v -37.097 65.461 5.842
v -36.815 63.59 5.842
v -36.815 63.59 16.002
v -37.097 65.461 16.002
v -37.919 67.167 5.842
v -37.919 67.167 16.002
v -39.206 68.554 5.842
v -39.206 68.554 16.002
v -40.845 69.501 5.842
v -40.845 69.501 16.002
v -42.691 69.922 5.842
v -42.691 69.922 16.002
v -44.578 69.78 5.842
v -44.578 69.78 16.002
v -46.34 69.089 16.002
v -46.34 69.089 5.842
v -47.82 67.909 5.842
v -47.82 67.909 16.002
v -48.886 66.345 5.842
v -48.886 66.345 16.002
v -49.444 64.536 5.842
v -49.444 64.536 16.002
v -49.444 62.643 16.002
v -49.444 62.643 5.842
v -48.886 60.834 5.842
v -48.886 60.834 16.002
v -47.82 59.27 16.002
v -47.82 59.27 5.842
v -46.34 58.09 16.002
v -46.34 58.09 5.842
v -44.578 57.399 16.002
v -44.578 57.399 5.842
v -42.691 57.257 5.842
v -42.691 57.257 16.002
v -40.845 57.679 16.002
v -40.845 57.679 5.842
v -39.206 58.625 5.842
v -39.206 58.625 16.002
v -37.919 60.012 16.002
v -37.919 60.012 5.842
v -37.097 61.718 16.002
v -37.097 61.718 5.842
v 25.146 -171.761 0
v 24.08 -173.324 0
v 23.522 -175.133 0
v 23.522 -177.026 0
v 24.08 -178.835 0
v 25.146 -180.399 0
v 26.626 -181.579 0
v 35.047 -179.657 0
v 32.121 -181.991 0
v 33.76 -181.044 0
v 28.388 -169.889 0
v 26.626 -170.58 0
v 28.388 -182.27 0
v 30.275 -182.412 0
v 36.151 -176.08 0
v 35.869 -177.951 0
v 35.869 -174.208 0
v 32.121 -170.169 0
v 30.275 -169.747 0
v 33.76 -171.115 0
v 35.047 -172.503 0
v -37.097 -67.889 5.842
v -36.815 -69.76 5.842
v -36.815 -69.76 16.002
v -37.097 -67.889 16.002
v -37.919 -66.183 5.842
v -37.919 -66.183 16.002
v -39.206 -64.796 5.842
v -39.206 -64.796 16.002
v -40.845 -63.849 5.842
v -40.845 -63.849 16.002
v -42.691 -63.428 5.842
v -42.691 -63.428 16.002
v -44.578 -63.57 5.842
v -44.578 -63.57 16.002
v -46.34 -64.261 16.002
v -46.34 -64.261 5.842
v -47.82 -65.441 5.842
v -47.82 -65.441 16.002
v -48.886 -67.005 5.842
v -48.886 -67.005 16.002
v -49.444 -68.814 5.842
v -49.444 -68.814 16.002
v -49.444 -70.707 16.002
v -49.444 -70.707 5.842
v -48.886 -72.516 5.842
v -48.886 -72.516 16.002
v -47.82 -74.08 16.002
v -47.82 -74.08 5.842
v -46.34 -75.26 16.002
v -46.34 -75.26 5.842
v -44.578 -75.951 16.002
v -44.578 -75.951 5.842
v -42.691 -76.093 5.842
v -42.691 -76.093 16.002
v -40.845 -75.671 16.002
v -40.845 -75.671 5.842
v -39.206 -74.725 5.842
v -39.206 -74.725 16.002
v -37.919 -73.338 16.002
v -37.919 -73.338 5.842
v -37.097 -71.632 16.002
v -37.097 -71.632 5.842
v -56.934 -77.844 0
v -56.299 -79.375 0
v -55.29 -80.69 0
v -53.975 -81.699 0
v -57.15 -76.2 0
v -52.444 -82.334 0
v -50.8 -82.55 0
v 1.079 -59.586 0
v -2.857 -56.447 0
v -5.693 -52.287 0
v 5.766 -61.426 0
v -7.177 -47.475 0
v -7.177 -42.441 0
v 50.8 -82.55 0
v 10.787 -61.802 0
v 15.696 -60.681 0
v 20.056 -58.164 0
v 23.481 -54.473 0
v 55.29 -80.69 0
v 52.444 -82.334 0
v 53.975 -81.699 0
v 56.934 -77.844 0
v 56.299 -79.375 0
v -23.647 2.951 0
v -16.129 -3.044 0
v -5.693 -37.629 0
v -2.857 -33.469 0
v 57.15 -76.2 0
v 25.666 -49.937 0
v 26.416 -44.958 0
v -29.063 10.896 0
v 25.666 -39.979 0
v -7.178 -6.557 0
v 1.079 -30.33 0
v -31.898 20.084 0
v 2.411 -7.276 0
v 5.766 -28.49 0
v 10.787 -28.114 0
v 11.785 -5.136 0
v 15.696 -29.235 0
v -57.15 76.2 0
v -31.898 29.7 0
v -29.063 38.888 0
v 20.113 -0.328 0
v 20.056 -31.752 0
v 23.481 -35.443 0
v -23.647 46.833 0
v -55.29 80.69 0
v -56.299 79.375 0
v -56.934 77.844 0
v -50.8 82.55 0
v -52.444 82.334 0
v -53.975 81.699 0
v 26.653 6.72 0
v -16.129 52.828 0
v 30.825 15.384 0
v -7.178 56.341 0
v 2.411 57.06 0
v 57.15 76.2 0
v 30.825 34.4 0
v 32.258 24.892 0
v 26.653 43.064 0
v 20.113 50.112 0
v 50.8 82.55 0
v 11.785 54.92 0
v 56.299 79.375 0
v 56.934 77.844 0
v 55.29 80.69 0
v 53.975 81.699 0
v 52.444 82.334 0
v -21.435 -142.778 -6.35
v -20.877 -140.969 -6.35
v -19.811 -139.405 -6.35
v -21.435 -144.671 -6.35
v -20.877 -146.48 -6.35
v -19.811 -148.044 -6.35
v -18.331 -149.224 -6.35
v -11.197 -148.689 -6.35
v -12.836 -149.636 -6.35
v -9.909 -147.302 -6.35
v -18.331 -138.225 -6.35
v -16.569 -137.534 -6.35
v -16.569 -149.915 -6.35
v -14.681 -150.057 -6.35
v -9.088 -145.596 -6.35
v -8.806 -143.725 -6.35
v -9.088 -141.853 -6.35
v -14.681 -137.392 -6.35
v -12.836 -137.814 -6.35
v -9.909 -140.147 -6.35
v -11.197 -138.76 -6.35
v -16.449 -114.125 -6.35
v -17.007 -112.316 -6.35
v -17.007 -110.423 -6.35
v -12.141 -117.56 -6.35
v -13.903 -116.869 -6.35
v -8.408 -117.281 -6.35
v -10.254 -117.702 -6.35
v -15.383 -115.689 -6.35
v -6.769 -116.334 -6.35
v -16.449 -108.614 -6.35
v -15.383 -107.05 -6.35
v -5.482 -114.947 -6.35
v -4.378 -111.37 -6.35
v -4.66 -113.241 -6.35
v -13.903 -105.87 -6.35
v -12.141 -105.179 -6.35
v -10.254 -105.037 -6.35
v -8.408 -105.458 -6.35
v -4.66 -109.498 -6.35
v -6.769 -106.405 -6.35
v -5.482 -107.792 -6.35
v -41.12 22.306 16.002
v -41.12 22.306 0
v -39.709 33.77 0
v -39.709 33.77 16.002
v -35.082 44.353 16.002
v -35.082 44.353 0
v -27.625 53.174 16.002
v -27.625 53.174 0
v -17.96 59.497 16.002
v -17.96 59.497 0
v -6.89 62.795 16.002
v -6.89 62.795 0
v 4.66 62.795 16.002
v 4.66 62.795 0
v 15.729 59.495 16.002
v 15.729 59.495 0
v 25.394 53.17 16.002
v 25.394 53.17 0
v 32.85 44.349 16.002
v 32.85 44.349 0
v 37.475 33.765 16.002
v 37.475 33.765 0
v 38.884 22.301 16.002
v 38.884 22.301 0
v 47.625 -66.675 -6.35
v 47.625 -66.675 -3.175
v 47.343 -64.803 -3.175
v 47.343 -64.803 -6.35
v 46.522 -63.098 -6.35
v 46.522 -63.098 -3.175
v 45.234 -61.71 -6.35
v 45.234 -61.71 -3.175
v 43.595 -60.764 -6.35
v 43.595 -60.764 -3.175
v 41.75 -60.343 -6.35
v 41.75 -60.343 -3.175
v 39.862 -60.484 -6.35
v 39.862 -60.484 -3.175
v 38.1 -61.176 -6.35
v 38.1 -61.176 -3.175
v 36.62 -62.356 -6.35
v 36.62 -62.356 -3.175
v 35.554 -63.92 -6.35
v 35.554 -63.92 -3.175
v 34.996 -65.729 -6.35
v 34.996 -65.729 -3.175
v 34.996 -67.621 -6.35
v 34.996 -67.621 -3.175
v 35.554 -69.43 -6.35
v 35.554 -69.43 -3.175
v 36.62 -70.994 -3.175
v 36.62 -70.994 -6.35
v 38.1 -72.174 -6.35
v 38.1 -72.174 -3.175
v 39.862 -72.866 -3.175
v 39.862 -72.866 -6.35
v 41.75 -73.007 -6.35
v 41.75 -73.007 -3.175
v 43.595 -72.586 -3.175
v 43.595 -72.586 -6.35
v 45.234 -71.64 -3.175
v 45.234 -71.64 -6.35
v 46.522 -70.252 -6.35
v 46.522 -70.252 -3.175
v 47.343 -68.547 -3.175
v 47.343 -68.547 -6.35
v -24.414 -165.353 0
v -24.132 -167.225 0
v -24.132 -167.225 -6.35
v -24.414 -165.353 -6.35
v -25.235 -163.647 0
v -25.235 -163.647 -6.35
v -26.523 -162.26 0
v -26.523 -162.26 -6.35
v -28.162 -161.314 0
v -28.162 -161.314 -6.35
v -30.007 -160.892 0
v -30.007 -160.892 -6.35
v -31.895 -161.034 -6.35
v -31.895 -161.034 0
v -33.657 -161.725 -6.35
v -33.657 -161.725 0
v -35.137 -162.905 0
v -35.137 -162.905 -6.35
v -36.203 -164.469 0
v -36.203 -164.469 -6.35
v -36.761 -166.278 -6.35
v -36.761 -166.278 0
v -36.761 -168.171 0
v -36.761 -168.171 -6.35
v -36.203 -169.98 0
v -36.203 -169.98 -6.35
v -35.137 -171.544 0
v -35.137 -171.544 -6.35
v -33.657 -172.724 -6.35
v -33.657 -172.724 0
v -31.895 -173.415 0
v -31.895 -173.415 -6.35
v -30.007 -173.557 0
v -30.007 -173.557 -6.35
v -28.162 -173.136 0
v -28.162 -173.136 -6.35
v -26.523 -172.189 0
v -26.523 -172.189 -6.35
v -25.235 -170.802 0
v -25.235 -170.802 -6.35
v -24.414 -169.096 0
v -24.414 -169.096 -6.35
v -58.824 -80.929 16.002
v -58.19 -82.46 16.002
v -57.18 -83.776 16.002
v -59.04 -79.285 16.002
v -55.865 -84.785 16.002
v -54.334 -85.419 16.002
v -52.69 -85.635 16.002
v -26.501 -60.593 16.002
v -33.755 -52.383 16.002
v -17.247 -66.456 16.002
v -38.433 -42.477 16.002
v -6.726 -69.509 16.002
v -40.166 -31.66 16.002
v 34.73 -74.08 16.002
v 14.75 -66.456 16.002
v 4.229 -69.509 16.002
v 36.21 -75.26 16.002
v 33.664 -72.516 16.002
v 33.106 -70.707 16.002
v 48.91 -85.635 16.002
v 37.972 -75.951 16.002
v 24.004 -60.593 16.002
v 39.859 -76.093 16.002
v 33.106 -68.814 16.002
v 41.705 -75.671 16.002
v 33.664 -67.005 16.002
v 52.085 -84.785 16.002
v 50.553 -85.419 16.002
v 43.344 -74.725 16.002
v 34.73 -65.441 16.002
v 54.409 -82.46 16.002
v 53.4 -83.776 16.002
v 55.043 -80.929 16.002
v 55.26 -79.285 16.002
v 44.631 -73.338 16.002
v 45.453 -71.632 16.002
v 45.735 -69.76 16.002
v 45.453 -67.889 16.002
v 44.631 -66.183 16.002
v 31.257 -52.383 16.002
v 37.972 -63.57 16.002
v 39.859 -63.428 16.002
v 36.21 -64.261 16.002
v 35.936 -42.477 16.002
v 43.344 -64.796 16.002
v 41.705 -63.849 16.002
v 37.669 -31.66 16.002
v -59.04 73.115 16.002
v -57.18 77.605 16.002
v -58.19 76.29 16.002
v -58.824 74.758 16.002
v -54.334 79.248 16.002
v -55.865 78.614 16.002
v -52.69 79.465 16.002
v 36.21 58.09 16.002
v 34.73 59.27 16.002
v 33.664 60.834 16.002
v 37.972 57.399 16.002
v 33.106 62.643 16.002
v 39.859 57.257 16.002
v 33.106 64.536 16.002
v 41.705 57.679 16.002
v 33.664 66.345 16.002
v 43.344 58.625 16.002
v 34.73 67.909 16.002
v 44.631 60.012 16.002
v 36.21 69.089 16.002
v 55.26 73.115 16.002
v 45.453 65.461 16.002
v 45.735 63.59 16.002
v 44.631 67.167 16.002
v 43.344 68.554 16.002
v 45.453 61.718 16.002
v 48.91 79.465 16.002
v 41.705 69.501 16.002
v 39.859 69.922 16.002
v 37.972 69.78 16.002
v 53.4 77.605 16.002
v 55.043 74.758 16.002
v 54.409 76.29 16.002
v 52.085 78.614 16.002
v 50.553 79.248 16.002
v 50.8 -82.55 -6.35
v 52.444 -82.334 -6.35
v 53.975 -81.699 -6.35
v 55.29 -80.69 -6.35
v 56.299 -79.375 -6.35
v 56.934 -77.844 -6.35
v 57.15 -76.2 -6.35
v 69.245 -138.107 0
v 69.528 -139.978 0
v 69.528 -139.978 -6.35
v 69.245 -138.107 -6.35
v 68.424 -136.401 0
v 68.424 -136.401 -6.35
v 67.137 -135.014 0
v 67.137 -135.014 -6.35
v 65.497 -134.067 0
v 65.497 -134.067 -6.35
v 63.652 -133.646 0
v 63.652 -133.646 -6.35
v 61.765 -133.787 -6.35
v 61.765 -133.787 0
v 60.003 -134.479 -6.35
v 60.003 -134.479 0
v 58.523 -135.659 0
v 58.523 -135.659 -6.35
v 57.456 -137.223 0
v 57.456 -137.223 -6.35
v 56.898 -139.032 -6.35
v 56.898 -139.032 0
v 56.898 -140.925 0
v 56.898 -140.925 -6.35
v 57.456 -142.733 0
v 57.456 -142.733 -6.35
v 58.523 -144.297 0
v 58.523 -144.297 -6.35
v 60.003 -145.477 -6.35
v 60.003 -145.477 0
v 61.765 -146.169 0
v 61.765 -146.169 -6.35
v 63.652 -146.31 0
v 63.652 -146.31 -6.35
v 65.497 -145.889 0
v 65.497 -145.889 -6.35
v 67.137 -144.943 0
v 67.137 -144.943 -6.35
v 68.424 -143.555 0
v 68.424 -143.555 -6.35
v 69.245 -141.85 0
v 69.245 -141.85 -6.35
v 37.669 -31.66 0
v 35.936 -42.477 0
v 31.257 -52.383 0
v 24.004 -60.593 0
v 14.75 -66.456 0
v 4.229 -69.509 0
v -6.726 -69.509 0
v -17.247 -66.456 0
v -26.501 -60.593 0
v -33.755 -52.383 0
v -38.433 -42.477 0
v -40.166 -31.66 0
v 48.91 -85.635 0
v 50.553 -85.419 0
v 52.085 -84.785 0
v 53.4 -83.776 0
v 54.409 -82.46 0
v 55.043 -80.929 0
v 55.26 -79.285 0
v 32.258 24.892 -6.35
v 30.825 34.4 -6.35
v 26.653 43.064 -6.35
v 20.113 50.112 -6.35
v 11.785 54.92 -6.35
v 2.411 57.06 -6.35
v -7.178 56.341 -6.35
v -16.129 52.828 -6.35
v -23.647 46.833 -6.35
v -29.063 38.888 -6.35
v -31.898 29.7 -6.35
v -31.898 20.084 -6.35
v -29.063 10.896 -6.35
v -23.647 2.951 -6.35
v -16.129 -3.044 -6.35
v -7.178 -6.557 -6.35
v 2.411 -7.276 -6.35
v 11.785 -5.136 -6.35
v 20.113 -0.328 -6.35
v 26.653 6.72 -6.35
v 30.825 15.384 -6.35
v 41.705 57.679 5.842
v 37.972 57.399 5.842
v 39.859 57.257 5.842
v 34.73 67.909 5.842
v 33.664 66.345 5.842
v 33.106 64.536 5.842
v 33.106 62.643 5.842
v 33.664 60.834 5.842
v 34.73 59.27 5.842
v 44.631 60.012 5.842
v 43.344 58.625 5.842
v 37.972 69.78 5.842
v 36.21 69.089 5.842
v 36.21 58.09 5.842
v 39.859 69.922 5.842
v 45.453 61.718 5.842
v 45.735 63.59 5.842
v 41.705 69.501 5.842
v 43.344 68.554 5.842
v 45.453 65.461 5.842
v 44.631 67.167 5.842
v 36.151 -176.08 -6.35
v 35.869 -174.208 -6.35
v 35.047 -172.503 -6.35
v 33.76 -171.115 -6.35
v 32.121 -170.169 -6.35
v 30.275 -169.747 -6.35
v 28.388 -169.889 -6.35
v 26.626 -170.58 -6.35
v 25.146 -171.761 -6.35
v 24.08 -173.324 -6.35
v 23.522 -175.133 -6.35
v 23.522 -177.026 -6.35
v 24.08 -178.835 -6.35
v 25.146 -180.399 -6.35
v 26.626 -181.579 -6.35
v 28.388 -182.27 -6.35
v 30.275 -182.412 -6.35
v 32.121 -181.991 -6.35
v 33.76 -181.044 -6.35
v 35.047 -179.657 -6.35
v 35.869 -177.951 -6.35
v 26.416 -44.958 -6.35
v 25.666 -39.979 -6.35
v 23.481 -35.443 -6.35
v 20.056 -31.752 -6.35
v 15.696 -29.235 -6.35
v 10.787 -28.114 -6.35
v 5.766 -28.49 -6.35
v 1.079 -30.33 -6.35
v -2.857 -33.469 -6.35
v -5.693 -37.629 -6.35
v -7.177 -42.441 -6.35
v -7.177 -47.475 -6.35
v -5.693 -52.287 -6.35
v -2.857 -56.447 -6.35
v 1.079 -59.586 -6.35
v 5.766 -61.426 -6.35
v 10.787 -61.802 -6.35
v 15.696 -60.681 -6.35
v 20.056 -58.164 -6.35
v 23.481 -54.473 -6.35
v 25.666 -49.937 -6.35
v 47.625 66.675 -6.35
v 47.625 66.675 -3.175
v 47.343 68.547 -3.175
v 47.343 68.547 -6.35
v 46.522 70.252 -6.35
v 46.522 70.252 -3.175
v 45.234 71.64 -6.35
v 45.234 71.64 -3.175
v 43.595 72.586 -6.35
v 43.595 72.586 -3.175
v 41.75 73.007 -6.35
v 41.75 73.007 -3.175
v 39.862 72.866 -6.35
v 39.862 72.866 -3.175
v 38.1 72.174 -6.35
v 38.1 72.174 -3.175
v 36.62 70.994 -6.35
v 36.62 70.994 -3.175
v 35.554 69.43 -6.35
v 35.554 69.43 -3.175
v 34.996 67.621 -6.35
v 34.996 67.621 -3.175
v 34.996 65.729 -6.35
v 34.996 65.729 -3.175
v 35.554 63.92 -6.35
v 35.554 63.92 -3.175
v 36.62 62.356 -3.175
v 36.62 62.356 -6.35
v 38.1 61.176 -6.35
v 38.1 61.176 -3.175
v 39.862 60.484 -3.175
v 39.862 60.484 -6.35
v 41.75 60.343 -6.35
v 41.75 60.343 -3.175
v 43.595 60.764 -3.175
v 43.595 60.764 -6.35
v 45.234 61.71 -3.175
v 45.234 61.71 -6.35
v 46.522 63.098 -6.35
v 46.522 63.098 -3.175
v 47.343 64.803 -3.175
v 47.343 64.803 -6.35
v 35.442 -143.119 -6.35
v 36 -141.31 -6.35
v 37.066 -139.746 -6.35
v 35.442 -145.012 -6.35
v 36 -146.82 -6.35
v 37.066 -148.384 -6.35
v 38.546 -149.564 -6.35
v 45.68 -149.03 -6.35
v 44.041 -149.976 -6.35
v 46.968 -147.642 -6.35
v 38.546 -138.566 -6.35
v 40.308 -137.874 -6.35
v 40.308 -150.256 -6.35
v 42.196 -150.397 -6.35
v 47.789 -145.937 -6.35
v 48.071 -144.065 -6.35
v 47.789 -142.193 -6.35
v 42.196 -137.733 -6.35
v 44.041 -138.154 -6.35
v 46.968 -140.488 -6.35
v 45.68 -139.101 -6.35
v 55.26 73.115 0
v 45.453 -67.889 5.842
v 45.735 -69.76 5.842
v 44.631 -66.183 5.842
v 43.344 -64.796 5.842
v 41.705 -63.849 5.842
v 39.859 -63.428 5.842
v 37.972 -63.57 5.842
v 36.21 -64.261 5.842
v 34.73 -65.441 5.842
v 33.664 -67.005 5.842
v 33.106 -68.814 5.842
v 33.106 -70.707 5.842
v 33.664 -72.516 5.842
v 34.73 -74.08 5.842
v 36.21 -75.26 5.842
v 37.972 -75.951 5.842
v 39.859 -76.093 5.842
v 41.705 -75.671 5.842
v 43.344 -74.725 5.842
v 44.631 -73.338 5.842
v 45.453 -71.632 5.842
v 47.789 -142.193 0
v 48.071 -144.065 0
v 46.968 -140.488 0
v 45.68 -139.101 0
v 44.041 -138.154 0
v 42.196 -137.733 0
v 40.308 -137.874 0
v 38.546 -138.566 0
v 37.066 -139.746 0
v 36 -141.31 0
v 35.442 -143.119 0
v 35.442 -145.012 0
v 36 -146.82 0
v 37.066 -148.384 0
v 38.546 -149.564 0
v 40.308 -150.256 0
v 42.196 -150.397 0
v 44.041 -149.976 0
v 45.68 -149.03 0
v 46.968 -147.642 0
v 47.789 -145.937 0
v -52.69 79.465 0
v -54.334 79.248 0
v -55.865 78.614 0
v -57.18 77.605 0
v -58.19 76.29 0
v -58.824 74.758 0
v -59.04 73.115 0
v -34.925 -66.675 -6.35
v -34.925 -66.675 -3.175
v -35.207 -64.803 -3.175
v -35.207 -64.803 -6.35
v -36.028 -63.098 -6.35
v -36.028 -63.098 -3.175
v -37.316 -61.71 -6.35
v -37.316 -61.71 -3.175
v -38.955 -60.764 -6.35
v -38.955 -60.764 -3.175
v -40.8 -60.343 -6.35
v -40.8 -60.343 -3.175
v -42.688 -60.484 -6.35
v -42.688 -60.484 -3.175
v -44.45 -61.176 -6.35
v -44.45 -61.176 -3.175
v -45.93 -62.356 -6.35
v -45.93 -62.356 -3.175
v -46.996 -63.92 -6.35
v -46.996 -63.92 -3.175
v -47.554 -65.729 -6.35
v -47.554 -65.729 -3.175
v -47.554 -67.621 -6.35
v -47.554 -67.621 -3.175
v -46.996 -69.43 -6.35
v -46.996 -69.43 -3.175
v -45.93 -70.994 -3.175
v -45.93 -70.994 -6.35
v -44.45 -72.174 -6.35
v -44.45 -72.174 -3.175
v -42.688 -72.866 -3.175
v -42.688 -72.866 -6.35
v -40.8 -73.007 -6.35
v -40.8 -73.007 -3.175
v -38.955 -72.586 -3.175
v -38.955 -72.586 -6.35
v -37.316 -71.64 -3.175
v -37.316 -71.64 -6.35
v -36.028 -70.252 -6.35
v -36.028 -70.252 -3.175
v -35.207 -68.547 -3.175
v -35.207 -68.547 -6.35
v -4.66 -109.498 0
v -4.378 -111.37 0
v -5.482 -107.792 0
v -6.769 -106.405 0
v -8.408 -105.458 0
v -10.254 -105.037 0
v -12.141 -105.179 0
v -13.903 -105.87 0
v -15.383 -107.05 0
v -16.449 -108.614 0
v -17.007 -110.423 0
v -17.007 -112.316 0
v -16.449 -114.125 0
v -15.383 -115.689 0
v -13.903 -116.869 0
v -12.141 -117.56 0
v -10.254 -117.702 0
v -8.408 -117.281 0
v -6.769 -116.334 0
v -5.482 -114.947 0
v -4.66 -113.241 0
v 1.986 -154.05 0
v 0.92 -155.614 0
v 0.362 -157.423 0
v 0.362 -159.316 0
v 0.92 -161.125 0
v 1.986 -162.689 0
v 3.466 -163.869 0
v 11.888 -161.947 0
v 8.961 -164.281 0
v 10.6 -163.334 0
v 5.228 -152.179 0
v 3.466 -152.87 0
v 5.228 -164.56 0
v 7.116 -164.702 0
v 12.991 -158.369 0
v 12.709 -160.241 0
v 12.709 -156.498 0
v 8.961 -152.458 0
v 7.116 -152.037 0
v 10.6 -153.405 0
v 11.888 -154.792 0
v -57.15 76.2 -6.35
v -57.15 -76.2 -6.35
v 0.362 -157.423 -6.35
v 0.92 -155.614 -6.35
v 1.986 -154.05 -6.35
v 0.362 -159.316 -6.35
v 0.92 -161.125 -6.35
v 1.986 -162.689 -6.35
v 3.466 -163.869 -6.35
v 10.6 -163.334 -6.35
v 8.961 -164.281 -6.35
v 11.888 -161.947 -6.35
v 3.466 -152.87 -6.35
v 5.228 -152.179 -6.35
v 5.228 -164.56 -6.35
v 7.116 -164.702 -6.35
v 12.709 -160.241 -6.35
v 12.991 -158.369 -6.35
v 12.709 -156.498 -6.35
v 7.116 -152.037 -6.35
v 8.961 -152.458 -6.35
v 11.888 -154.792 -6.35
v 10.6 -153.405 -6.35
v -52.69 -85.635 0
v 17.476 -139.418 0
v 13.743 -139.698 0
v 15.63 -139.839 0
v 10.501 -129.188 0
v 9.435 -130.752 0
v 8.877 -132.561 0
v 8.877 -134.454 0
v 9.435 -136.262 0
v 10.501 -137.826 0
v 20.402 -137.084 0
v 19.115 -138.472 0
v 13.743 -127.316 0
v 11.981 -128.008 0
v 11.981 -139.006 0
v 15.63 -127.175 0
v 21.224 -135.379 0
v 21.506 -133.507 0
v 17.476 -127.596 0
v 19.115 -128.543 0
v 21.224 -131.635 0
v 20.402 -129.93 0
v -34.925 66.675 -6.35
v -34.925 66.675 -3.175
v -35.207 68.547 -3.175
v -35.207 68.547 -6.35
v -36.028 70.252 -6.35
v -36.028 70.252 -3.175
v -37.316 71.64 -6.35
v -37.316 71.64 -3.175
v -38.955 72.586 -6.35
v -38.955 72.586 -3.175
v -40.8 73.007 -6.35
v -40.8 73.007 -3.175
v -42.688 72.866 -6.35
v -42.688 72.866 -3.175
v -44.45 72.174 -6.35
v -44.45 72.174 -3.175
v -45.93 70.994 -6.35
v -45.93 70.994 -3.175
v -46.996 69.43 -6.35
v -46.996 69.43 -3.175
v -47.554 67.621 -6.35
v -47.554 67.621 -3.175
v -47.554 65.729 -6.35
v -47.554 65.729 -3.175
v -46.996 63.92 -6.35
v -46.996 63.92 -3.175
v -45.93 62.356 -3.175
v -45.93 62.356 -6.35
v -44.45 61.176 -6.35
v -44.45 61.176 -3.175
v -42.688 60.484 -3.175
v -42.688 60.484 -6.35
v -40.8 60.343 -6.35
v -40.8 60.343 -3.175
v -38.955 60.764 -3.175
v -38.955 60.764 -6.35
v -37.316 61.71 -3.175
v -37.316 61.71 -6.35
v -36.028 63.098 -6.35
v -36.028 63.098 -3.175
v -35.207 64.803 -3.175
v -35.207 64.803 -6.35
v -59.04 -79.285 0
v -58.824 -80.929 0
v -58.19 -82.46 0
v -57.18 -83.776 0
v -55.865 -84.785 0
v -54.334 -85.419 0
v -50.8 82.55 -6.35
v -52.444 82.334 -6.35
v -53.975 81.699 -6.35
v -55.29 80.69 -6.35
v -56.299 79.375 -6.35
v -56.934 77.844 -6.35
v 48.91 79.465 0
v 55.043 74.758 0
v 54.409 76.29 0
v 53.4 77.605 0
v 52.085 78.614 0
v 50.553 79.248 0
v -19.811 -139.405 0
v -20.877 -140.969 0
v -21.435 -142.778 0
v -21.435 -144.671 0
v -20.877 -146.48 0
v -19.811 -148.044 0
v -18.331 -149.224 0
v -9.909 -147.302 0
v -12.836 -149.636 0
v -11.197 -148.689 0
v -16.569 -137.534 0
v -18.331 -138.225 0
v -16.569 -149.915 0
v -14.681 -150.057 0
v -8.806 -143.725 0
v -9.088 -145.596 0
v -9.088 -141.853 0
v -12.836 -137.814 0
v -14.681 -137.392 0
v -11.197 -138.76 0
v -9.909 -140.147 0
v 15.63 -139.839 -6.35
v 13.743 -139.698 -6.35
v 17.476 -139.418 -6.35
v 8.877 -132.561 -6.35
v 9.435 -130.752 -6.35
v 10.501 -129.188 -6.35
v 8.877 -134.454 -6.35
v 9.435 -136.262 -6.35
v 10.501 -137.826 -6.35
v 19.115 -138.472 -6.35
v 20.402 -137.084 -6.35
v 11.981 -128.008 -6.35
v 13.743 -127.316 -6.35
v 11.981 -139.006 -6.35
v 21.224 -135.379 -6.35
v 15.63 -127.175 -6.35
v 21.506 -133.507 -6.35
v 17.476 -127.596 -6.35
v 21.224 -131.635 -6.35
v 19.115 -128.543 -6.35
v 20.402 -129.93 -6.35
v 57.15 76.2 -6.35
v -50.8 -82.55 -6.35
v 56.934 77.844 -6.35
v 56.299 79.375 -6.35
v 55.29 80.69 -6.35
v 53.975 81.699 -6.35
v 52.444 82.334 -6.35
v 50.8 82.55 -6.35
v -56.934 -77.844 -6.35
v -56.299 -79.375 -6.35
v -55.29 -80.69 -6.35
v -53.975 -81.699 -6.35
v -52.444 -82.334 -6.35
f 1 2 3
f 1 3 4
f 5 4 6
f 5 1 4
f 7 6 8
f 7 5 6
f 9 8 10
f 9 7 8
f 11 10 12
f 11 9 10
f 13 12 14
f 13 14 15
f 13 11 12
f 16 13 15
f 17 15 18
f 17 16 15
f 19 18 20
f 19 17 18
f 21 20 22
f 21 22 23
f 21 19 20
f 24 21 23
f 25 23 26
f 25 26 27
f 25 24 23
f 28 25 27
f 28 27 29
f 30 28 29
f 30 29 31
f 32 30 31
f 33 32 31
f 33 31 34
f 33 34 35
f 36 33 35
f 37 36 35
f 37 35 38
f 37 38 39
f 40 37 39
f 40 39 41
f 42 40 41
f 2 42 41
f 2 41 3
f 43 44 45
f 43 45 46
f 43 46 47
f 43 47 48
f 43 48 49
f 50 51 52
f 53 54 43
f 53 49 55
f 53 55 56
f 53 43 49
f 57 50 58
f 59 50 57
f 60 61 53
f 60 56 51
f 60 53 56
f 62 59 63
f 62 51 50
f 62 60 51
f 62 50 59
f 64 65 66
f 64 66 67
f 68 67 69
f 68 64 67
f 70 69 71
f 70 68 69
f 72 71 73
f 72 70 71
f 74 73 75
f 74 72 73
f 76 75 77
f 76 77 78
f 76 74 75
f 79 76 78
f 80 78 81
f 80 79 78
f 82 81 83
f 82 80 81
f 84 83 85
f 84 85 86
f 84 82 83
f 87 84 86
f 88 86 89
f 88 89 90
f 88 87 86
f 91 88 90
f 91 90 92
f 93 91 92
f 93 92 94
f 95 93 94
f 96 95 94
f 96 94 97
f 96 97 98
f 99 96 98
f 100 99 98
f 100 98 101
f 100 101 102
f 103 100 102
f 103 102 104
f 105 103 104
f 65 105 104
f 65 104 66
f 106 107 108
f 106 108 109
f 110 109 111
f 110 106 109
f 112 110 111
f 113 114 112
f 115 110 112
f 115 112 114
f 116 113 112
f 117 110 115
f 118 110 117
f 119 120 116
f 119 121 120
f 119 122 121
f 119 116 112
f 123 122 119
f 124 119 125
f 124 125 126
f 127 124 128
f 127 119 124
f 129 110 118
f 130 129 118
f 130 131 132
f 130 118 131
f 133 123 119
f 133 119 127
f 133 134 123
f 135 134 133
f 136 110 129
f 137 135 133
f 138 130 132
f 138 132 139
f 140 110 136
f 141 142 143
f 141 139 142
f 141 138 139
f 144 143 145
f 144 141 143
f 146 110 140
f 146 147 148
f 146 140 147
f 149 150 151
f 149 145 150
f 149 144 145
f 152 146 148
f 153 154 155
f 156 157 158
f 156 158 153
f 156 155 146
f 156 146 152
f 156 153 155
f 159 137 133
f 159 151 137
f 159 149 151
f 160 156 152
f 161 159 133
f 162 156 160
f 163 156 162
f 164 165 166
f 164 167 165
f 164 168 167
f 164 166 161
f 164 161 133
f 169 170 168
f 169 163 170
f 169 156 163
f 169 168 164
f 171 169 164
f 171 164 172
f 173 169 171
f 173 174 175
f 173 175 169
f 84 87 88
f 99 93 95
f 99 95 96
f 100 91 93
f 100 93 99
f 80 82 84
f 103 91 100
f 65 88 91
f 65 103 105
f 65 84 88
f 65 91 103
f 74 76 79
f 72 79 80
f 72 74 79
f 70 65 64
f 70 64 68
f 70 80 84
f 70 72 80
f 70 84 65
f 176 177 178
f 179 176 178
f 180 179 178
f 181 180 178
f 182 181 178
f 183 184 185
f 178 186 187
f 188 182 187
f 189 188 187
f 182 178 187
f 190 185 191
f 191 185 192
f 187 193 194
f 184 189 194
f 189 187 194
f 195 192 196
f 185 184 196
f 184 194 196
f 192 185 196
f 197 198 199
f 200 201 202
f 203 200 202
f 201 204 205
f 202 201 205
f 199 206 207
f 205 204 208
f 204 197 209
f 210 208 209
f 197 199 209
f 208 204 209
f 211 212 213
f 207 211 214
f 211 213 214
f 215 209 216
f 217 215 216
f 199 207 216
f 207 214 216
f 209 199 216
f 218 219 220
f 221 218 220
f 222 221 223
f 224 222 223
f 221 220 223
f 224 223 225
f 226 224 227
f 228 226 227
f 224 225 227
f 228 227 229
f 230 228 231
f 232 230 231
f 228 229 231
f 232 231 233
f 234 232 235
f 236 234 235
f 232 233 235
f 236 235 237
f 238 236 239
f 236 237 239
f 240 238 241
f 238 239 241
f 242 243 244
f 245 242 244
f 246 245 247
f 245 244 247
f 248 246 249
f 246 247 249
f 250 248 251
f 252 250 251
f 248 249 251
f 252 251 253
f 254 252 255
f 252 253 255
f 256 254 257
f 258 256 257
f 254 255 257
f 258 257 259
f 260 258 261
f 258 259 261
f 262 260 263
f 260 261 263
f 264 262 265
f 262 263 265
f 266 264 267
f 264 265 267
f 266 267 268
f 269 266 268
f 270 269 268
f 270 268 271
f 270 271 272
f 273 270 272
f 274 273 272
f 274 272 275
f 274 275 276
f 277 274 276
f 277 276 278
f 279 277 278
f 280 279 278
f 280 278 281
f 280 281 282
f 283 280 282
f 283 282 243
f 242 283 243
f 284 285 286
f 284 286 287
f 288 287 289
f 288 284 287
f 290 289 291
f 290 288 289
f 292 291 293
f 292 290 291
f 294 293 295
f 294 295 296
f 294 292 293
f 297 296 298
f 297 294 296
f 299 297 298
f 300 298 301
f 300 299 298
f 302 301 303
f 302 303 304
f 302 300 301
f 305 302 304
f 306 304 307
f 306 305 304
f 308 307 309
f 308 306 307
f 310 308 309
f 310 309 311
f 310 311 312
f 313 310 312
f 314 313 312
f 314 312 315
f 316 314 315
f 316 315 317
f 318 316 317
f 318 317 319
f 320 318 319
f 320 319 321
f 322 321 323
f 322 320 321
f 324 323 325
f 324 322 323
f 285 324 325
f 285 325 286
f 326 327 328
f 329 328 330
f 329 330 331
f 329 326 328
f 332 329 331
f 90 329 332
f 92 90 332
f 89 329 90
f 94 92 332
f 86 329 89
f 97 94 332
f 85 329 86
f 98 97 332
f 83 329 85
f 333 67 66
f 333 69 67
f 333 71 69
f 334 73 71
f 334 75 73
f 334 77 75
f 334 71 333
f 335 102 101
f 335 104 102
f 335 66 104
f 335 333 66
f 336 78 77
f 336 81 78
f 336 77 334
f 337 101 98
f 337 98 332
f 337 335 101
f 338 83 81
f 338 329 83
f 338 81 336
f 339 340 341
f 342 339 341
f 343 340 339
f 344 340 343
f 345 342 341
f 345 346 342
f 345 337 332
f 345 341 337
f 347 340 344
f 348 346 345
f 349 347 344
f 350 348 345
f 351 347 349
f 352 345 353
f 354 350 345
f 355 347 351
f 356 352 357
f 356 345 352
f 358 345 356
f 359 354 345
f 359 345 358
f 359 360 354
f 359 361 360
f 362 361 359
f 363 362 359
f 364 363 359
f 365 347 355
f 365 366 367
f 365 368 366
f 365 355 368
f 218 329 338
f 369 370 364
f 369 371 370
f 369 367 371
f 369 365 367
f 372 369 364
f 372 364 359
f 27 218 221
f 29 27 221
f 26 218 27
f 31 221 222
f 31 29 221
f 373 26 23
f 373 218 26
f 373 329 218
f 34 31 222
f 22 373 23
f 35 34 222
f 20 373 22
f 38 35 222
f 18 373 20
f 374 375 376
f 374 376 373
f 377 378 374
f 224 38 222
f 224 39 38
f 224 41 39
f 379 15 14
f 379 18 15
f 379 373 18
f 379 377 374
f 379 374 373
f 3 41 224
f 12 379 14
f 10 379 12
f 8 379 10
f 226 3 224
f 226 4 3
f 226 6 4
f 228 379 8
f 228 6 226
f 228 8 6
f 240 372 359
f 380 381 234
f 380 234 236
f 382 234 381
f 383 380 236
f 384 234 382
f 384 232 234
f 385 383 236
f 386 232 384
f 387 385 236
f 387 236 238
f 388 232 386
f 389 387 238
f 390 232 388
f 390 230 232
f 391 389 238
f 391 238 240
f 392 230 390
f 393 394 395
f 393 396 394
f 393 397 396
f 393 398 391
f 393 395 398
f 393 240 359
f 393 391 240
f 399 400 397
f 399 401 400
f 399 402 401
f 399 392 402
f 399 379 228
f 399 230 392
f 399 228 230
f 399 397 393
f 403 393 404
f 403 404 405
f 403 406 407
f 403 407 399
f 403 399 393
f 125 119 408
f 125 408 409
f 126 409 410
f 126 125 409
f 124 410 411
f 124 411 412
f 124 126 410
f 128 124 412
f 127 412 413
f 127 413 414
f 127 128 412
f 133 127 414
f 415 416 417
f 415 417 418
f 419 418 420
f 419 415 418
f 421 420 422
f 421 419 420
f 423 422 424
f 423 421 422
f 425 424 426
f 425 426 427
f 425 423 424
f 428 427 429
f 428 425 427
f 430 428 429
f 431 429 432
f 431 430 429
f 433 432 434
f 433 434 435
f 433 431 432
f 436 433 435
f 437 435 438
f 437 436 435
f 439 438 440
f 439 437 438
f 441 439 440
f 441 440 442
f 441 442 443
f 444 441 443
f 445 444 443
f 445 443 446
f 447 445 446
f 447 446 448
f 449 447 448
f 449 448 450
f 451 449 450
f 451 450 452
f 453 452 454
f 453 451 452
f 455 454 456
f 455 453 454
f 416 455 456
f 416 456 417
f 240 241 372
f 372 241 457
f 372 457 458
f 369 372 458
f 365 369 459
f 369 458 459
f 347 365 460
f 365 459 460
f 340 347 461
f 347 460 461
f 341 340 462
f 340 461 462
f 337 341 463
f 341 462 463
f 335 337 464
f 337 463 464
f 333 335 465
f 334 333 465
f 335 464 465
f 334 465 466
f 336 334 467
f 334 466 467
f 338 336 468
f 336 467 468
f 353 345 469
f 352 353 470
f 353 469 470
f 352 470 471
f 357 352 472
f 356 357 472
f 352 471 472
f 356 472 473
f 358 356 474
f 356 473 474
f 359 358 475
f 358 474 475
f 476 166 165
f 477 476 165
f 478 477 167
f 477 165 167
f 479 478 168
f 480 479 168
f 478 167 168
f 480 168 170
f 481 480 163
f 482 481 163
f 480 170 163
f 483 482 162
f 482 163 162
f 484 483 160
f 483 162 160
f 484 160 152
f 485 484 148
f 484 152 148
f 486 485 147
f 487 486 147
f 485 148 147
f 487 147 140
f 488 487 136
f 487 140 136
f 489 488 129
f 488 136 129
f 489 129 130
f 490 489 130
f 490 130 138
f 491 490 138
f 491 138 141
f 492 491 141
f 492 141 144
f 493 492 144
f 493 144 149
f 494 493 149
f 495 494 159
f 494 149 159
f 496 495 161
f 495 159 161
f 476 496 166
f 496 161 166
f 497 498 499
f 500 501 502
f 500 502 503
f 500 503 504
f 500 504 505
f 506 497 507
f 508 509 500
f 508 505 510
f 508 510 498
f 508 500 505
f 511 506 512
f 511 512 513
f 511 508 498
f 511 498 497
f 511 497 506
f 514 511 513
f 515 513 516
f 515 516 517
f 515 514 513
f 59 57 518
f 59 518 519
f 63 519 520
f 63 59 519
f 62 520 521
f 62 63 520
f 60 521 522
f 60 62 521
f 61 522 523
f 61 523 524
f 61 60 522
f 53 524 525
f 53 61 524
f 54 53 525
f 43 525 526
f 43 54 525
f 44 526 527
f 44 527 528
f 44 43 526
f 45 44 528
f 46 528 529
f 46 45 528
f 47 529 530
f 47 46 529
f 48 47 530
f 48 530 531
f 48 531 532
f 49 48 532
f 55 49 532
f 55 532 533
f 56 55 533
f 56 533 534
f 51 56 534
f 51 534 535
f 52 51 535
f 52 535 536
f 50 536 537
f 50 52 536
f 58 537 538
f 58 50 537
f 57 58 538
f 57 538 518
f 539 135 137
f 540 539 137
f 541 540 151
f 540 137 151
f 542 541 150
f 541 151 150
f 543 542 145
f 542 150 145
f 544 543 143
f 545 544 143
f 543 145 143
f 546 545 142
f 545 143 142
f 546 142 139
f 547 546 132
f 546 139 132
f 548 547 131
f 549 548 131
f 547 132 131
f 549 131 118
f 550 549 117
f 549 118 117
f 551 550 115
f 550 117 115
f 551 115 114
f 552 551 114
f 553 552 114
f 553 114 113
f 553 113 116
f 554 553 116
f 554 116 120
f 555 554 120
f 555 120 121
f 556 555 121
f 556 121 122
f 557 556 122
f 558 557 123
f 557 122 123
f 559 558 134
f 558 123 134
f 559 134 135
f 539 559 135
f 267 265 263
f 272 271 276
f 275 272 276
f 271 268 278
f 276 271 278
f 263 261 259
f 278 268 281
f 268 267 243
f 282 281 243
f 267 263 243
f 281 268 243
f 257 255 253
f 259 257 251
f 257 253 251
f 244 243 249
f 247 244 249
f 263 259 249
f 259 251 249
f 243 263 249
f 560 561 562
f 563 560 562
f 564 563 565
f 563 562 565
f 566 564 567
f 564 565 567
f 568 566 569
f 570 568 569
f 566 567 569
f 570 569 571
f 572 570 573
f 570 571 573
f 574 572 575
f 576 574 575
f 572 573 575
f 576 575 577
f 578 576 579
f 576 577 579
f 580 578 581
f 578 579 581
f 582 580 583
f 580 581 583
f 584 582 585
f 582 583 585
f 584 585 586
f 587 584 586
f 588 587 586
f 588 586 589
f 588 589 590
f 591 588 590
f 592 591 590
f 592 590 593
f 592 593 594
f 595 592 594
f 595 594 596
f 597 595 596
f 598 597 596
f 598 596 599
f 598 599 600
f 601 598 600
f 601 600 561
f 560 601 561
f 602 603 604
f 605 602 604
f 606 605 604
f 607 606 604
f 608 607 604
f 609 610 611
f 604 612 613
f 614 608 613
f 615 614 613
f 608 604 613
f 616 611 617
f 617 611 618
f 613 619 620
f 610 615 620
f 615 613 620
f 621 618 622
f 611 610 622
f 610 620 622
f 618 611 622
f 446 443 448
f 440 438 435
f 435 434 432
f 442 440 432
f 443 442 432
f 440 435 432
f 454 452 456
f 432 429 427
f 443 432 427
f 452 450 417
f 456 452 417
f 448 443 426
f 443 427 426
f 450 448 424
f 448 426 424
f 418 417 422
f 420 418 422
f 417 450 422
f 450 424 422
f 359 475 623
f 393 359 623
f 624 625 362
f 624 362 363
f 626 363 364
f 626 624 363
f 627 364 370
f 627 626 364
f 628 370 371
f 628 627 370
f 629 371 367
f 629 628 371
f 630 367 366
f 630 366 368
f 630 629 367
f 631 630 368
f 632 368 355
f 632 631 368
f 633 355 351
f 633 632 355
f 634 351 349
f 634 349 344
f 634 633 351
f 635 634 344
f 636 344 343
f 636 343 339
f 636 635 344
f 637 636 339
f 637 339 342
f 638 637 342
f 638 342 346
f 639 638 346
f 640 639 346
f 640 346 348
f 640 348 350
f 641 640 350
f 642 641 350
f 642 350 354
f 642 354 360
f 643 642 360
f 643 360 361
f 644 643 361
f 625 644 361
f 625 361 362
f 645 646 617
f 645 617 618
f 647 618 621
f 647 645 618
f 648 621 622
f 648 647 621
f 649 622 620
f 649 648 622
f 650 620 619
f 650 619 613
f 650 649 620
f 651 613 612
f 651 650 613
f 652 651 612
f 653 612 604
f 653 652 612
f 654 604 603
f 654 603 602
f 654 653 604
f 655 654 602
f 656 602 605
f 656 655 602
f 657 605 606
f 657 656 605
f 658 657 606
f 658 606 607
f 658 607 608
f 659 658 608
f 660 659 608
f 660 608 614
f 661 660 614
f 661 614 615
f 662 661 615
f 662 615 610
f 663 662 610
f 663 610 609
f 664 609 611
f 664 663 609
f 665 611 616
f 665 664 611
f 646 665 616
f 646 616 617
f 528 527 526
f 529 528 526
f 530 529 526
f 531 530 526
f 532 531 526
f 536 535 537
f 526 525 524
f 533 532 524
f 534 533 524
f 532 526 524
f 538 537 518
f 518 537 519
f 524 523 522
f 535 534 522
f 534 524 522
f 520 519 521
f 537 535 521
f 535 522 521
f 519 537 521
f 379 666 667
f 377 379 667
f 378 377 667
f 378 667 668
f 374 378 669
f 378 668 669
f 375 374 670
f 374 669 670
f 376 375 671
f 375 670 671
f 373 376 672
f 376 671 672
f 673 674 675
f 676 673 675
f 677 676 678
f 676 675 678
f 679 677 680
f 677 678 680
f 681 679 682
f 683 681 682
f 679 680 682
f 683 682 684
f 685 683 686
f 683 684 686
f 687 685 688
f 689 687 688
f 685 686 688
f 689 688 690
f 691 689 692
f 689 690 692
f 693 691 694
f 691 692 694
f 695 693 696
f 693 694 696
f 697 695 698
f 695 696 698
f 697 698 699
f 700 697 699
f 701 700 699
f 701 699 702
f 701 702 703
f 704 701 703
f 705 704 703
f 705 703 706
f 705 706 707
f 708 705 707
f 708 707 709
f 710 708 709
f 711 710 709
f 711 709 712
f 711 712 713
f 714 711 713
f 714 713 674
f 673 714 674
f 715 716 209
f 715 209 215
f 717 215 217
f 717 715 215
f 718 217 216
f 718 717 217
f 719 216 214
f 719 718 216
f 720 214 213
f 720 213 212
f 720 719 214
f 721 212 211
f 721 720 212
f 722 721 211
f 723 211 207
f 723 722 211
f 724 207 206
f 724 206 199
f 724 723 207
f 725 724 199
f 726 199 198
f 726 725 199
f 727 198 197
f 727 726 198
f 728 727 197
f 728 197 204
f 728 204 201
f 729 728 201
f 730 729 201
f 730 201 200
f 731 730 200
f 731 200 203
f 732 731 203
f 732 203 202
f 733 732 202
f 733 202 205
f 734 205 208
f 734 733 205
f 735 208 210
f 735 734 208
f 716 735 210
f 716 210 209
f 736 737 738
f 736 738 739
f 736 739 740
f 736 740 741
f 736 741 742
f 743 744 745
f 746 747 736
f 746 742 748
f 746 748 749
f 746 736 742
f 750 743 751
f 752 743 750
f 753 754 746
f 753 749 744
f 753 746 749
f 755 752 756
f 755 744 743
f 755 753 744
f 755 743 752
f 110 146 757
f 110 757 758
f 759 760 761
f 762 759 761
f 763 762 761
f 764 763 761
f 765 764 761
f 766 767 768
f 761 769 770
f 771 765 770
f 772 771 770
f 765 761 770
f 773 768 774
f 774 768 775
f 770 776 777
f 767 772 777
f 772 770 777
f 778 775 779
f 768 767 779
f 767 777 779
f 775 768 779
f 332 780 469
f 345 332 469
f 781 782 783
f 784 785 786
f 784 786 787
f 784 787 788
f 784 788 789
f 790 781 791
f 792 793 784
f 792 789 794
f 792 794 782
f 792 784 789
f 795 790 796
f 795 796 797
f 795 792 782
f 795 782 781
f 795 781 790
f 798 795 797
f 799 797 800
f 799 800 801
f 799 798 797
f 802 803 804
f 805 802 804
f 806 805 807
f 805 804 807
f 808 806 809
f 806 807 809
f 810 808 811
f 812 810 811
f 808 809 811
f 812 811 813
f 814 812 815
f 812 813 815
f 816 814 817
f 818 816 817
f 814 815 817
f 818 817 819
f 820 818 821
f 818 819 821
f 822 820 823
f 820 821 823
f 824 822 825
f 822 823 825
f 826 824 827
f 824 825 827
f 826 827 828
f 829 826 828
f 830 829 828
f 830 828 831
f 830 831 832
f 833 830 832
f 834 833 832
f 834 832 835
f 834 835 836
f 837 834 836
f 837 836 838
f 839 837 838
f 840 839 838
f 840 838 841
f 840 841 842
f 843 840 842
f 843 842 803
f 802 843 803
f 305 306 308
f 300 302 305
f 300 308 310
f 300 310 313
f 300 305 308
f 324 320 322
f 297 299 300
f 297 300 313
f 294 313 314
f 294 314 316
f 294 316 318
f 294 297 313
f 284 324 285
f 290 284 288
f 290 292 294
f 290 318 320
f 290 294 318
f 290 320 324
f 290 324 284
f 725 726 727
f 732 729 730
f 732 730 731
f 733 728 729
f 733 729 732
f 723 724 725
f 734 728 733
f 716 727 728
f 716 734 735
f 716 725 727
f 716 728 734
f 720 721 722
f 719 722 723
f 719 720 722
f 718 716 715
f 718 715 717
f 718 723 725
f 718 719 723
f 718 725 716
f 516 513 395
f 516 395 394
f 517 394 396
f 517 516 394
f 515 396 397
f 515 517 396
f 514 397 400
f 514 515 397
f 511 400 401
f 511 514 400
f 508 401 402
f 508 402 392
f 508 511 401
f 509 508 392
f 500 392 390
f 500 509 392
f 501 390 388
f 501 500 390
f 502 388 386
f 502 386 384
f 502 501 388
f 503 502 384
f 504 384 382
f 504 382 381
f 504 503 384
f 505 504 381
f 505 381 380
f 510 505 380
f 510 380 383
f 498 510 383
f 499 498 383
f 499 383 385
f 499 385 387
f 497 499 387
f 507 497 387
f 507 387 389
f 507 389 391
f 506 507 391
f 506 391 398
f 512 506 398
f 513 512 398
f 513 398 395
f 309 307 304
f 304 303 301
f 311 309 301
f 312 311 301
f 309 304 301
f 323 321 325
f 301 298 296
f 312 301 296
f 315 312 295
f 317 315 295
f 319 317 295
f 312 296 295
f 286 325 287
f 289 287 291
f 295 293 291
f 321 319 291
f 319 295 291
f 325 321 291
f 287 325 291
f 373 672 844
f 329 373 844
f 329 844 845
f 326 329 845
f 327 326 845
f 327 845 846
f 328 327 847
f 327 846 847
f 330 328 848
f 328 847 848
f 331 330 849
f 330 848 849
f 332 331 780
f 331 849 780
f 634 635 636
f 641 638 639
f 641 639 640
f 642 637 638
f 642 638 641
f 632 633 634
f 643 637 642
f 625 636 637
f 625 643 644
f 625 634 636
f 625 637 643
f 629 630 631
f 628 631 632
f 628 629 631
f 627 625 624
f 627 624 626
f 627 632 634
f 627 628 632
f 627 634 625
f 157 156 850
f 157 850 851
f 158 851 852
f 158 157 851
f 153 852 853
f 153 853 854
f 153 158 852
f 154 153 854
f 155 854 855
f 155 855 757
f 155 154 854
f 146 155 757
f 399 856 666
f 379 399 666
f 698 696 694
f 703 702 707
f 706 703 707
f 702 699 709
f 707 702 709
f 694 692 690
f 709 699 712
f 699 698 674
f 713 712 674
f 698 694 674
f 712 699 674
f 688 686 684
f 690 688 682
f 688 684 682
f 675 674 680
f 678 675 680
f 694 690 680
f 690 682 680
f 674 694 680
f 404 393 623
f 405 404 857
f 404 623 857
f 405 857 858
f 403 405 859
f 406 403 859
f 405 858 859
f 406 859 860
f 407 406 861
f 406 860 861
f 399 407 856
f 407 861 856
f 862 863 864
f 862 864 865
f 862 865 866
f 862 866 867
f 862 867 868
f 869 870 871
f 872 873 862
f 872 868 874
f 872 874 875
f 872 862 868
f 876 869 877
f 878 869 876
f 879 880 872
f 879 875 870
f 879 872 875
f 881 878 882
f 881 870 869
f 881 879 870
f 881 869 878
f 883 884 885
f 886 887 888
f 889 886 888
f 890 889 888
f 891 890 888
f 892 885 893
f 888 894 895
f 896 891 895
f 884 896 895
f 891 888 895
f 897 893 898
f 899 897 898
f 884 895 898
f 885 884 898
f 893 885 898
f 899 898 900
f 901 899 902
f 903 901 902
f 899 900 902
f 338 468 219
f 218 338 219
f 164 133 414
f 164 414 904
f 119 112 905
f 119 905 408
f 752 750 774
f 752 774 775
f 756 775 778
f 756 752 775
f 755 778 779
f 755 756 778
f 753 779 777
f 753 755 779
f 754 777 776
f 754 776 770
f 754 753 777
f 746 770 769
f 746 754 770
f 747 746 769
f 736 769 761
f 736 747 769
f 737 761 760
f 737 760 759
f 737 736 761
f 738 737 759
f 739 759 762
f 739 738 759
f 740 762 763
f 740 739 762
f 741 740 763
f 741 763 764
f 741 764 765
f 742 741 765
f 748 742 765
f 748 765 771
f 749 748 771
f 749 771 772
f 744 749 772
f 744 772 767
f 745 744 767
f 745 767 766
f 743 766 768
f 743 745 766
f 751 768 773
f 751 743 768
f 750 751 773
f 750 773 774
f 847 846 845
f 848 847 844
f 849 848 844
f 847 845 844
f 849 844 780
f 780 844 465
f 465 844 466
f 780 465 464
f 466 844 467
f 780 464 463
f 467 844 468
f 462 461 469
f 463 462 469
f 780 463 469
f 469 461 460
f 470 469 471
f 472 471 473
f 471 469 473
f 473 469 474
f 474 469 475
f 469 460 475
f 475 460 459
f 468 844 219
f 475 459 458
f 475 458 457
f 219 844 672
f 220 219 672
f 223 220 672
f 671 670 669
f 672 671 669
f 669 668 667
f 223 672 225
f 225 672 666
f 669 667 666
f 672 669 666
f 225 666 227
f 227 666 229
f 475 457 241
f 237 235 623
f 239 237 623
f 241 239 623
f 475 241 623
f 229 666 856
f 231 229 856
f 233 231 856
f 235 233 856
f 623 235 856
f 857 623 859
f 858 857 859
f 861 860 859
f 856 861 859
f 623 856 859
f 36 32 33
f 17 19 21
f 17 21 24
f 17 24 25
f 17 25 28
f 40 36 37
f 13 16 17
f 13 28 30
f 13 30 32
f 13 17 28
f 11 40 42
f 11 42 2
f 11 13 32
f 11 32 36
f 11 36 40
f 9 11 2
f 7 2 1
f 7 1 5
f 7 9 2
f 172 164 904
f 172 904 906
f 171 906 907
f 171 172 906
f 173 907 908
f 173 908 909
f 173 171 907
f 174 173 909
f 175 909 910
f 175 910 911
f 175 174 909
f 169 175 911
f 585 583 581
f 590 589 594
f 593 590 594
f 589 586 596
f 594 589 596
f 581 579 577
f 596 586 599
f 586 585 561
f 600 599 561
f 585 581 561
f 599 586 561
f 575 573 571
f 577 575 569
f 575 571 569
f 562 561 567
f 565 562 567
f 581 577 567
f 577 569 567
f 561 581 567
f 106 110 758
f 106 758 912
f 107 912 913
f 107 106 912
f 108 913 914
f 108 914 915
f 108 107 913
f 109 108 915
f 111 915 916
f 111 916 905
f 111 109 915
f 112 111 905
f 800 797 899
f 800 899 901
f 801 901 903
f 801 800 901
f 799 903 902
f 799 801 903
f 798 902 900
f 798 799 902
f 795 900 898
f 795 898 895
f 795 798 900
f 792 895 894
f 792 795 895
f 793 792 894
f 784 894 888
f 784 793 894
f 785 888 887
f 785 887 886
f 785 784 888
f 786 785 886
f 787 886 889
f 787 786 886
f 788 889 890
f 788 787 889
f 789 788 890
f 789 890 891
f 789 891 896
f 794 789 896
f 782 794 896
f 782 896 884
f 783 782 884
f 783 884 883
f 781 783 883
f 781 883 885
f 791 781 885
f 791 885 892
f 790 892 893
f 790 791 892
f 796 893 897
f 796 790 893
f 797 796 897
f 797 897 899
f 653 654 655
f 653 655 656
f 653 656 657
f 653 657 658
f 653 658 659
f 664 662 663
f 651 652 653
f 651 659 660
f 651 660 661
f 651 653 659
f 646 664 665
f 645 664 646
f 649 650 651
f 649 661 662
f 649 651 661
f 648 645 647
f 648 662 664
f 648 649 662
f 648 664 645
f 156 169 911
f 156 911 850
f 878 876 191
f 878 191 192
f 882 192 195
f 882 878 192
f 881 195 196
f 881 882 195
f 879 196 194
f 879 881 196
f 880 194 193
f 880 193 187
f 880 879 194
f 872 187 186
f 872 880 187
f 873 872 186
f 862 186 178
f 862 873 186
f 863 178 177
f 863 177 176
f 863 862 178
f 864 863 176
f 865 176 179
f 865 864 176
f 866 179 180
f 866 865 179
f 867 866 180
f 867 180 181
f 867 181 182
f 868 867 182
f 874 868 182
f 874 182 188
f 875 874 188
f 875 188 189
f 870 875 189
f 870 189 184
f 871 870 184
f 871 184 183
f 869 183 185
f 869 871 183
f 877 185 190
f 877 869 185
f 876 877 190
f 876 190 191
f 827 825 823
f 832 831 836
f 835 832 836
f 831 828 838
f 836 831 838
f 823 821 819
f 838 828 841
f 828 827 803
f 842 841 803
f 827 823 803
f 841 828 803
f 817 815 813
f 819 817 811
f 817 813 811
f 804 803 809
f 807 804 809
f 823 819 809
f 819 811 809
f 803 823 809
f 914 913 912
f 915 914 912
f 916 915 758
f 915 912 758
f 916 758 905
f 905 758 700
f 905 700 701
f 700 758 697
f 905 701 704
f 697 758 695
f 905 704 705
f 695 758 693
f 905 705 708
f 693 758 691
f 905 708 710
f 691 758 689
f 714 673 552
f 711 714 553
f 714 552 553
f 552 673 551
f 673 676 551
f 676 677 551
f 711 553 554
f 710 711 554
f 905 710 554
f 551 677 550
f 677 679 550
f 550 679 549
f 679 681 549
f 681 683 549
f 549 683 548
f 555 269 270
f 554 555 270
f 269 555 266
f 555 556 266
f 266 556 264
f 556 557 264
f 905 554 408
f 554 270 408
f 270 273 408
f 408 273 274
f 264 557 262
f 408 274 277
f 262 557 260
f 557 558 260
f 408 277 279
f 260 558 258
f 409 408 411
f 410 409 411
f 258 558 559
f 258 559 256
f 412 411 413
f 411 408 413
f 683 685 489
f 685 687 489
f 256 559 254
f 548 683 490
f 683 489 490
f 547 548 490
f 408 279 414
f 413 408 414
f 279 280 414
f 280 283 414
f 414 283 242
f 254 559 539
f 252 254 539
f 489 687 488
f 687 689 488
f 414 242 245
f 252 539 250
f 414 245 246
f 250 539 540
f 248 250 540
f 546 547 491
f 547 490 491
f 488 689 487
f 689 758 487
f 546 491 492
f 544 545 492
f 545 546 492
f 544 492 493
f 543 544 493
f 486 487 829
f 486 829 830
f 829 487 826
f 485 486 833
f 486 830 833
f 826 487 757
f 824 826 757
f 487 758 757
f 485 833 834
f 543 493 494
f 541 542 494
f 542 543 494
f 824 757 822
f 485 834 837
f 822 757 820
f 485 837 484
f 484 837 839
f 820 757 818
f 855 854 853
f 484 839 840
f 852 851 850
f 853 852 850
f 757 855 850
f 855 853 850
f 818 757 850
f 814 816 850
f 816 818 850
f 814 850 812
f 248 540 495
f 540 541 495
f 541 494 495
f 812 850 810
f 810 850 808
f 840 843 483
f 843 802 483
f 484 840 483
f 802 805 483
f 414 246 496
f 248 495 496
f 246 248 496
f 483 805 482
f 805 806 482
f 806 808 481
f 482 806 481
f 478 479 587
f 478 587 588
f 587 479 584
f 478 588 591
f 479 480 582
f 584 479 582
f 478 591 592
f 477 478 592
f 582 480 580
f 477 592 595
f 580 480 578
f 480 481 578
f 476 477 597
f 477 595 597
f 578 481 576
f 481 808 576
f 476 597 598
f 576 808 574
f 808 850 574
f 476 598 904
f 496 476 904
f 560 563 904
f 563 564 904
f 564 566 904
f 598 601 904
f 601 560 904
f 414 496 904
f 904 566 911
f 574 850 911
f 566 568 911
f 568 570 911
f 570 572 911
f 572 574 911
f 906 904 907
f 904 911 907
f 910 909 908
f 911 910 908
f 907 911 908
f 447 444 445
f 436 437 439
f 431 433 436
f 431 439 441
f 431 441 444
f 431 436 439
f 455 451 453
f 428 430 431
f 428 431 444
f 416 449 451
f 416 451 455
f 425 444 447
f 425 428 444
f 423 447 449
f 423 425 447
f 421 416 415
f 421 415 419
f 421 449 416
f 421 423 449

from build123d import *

# Parameters (mm, degrees)
F0_R     = 6.35
F2_DEPTH = 3.175
F0_R_2   = 16.891
F0_R_3   = 32.258
F3_DEPTH = 6.35
F1_R     = 6.35
F4_DEPTH = 5.842
F5_DEPTH = 16.002
F6_R     = 6.35
F7_DEPTH = 6.35


with BuildPart() as f2:
    # F0 (on Top) → F2 (new body)
    with BuildSketch(Plane.XY):
        with Locations((-41.275, -66.675)):
            Circle(F0_R)
    extrude(amount=-F2_DEPTH)



with BuildPart() as f2b:
    # F0 (on Top) → F2, piece 2 (new body)
    with BuildSketch(Plane.XY):
        with Locations((-41.275, 66.675)):
            Circle(F0_R)
    extrude(amount=-F2_DEPTH)


with BuildPart() as f2c:
    # F0 (on Top) → F2, piece 3 (new body)
    with BuildSketch(Plane.XY):
        with Locations((41.275, 66.675)):
            Circle(F0_R)
    extrude(amount=-F2_DEPTH)


with BuildPart() as f2d:
    # F0 (on Top) → F2, piece 4 (new body)
    with BuildSketch(Plane.XY):
        with Locations((41.275, -66.675)):
            Circle(F0_R)
    extrude(amount=-F2_DEPTH)


with BuildPart() as f2_1:
    add(f2.part)

    add(f2b.part)  # F3 merges F2b

    add(f2c.part)  # F3 merges F2c

    add(f2d.part)  # F3 merges F2d
    # F0 (on Top) → F3 (join)
    with BuildSketch(Plane.XY):
        with BuildLine():
            Line((-50.8, -82.55), (50.8, -82.55))
            ThreePointArc((50.8, -82.55), (55.2901280605, -80.6901280605), (57.15, -76.2))
            Line((57.15, -76.2), (57.15, 76.2))
            ThreePointArc((57.15, 76.2), (55.2901280605, 80.6901280605), (50.8, 82.55))
            Line((50.8, 82.55), (-50.8, 82.55))
            ThreePointArc((-50.8, 82.55), (-55.2901280605, 80.6901280605), (-57.15, 76.2))
            Line((-57.15, 76.2), (-57.15, -76.2))
            ThreePointArc((-57.15, -76.2), (-55.2901280605, -80.6901280605), (-50.8, -82.55))
        make_face()
        with Locations((-41.275, -66.675)):
            Circle(F0_R, mode=Mode.SUBTRACT)
        with Locations((9.525, -44.958)):
            Circle(F0_R_2, mode=Mode.SUBTRACT)
        with Locations((41.275, -66.675)):
            Circle(F0_R, mode=Mode.SUBTRACT)
        with Locations((-41.275, 66.675)):
            Circle(F0_R, mode=Mode.SUBTRACT)
        with Locations((0, 24.892)):
            Circle(F0_R_3, mode=Mode.SUBTRACT)
        with Locations((41.275, 66.675)):
            Circle(F0_R, mode=Mode.SUBTRACT)
    extrude(amount=-F3_DEPTH)


with BuildPart() as f4:
    # F1 (on Top) → F4 (new body)
    with BuildSketch(Plane.XY):
        with Locations((39.384733719, 63.5895566996)):
            Circle(F1_R)
    extrude(amount=F4_DEPTH)



with BuildPart() as f4b:
    # F1 (on Top) → F4, piece 2 (new body)
    with BuildSketch(Plane.XY):
        with Locations((-43.165266281, 63.5895566996)):
            Circle(F1_R)
    extrude(amount=F4_DEPTH)


with BuildPart() as f4c:
    # F1 (on Top) → F4, piece 3 (new body)
    with BuildSketch(Plane.XY):
        with Locations((-43.165266281, -69.7604433004)):
            Circle(F1_R)
    extrude(amount=F4_DEPTH)


with BuildPart() as f4d:
    # F1 (on Top) → F4, piece 4 (new body)
    with BuildSketch(Plane.XY):
        with Locations((39.384733719, -69.7604433004)):
            Circle(F1_R)
    extrude(amount=F4_DEPTH)


with BuildPart() as f4_1:
    add(f4.part)

    add(f4b.part)  # F5 merges F4b

    add(f4c.part)  # F5 merges F4c

    add(f4d.part)  # F5 merges F4d
    # F1 (on Top) → F5 (join)
    with BuildSketch(Plane.XY):
        with BuildLine():
            Line((-52.690266281, -85.6354433004), (48.909733719, -85.6354433004))
            ThreePointArc((48.909733719, -85.6354433004), (53.3998617796, -83.7755713609), (55.259733719, -79.2854433004))
            Line((55.259733719, -79.2854433004), (55.259733719, 73.1145566996))
            ThreePointArc((55.259733719, 73.1145566996), (53.3998617796, 77.6046847601), (48.909733719, 79.4645566996))
            Line((48.909733719, 79.4645566996), (-52.690266281, 79.4645566996))
            ThreePointArc((-52.690266281, 79.4645566996), (-57.1803943415, 77.6046847601), (-59.040266281, 73.1145566996))
            Line((-59.040266281, 73.1145566996), (-59.040266281, -79.2854433004))
            ThreePointArc((-59.040266281, -79.2854433004), (-57.1803943415, -83.7755713609), (-52.690266281, -85.6354433004))
        make_face()
        with Locations((-43.165266281, -69.7604433004)):
            Circle(F1_R, mode=Mode.SUBTRACT)
        with Locations((39.384733719, -69.7604433004)):
            Circle(F1_R, mode=Mode.SUBTRACT)
        with BuildLine():
            ThreePointArc((-41.1198244616, 22.3061300117), (-1.1151278345, 63.2139243167), (38.8841910485, 22.3008716804))
            Line((38.8841910485, 22.3008716804), (37.668826681, -31.6604433004))
            ThreePointArc((37.668826681, -31.6604433004), (-1.2486367631, -69.896214704), (-40.1661002073, -31.6604433004))
            Line((-40.1661002073, -31.6604433004), (-41.1198244616, 22.3061300117))
        make_face(mode=Mode.SUBTRACT)
        with Locations((-43.165266281, 63.5895566996)):
            Circle(F1_R, mode=Mode.SUBTRACT)
        with Locations((39.384733719, 63.5895566996)):
            Circle(F1_R, mode=Mode.SUBTRACT)
    extrude(amount=F5_DEPTH)


with BuildPart() as f7:
    # F6 (on Top) → F7 (new body)
    with BuildSketch(Plane.XY):
        with Locations((29.8007111996, -176.0796308517)):
            Circle(F6_R)
    extrude(amount=-F7_DEPTH)


with BuildPart() as f7b:
    # F6 (on Top) → F7, piece 2 (new body)
    with BuildSketch(Plane.XY):
        with Locations((63.177511096, -139.9782001972)):
            Circle(F6_R)
    extrude(amount=-F7_DEPTH)


with BuildPart() as f7c:
    # F6 (on Top) → F7, piece 3 (new body)
    with BuildSketch(Plane.XY):
        with Locations((41.7209938169, -144.065156579)):
            Circle(F6_R)
    extrude(amount=-F7_DEPTH)


with BuildPart() as f7d:
    # F6 (on Top) → F7, piece 4 (new body)
    with BuildSketch(Plane.XY):
        with Locations((6.6412999295, -158.3694964647)):
            Circle(F6_R)
    extrude(amount=-F7_DEPTH)


with BuildPart() as f7e:
    # F6 (on Top) → F7, piece 5 (new body)
    with BuildSketch(Plane.XY):
        with Locations((-30.4818730801, -167.2245711088)):
            Circle(F6_R)
    extrude(amount=-F7_DEPTH)


with BuildPart() as f7f:
    # F6 (on Top) → F7, piece 6 (new body)
    with BuildSketch(Plane.XY):
        with Locations((-15.1557931677, -143.7245756388)):
            Circle(F6_R)
    extrude(amount=-F7_DEPTH)


with BuildPart() as f7g:
    # F6 (on Top) → F7, piece 7 (new body)
    with BuildSketch(Plane.XY):
        with Locations((15.1557894424, -133.5071921349)):
            Circle(F6_R)
    extrude(amount=-F7_DEPTH)


with BuildPart() as f7h:
    # F6 (on Top) → F7, piece 8 (new body)
    with BuildSketch(Plane.XY):
        with Locations((-10.7282577083, -111.3695204258)):
            Circle(F6_R)
    extrude(amount=-F7_DEPTH)


solid = Compound([f2_1.part, f4_1.part, f7.part, f7b.part, f7c.part, f7d.part, f7e.part, f7f.part, f7g.part, f7h.part])
